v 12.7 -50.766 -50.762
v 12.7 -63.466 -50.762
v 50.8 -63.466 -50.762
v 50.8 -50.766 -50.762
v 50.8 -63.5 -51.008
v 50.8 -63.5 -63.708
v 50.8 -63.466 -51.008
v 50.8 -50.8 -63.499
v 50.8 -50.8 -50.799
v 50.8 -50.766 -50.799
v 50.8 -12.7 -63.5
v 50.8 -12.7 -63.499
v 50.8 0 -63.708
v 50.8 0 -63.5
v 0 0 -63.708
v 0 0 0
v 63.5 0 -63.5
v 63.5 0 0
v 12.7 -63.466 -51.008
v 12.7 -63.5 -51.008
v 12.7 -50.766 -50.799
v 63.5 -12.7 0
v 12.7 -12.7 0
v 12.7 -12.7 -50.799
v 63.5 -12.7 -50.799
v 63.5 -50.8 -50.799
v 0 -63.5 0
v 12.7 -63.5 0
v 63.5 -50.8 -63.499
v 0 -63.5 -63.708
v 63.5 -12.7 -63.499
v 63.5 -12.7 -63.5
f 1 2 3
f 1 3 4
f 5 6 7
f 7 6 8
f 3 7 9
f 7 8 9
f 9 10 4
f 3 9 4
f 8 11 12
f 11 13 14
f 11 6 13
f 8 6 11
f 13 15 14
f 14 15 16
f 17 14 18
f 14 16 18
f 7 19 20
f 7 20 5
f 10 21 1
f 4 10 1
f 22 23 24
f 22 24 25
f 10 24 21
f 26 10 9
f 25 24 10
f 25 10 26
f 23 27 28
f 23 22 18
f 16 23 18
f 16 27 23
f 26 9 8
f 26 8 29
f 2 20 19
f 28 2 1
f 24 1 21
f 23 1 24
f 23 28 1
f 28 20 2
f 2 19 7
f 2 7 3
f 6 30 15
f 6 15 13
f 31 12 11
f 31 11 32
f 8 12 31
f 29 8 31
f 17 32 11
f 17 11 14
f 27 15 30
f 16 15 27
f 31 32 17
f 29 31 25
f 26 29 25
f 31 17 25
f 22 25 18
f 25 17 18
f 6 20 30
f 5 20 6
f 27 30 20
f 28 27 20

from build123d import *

# Parameters (mm, degrees)
F0_W     = 63.5
F0_H     = 63.5
F1_DEPTH = 12.7
F2_W     = 63.5
F2_H     = 63.5
F3_DEPTH = 12.7
F4_W     = 63.5
F4_H     = 12.7
F5_DEPTH = 50.8
F6_W     = 12.7
F6_H     = 12.7
F7_DEPTH = 50.8
F8_W     = 50.8
F8_H     = 12.7
F9_DEPTH = 63.5


with BuildPart() as f1:
    # F0 (on Front) → F1 (new body)
    with BuildSketch(Plane.XZ):
        with Locations((31.75, -31.75)):
            Rectangle(F0_W, F0_H)
    extrude(amount=F1_DEPTH)

    # F2 (on Right) → F3 (join)
    with BuildSketch(Plane.YZ):
        with Locations((-31.75, -31.75)):
            Rectangle(F2_W, F2_H)
    extrude(amount=F3_DEPTH)

    # F4 (on Front) → F5 (join)
    with BuildSketch(Plane.XZ):
        with Locations((31.75, -57.149136)):
            Rectangle(F4_W, F4_H)
    extrude(amount=F5_DEPTH)

    # F6 (on Right) → F7 (join)
    with BuildSketch(Plane.YZ):
        with Locations((-57.11578, -57.112239)):
            Rectangle(F6_W, F6_H)
    extrude(amount=F7_DEPTH)

    # F8 (on Front) → F9 (join)
    with BuildSketch(Plane.XZ):
        with Locations((25.4, -57.358216)):
            Rectangle(F8_W, F8_H)
    extrude(amount=F9_DEPTH)


solid = f1.part
